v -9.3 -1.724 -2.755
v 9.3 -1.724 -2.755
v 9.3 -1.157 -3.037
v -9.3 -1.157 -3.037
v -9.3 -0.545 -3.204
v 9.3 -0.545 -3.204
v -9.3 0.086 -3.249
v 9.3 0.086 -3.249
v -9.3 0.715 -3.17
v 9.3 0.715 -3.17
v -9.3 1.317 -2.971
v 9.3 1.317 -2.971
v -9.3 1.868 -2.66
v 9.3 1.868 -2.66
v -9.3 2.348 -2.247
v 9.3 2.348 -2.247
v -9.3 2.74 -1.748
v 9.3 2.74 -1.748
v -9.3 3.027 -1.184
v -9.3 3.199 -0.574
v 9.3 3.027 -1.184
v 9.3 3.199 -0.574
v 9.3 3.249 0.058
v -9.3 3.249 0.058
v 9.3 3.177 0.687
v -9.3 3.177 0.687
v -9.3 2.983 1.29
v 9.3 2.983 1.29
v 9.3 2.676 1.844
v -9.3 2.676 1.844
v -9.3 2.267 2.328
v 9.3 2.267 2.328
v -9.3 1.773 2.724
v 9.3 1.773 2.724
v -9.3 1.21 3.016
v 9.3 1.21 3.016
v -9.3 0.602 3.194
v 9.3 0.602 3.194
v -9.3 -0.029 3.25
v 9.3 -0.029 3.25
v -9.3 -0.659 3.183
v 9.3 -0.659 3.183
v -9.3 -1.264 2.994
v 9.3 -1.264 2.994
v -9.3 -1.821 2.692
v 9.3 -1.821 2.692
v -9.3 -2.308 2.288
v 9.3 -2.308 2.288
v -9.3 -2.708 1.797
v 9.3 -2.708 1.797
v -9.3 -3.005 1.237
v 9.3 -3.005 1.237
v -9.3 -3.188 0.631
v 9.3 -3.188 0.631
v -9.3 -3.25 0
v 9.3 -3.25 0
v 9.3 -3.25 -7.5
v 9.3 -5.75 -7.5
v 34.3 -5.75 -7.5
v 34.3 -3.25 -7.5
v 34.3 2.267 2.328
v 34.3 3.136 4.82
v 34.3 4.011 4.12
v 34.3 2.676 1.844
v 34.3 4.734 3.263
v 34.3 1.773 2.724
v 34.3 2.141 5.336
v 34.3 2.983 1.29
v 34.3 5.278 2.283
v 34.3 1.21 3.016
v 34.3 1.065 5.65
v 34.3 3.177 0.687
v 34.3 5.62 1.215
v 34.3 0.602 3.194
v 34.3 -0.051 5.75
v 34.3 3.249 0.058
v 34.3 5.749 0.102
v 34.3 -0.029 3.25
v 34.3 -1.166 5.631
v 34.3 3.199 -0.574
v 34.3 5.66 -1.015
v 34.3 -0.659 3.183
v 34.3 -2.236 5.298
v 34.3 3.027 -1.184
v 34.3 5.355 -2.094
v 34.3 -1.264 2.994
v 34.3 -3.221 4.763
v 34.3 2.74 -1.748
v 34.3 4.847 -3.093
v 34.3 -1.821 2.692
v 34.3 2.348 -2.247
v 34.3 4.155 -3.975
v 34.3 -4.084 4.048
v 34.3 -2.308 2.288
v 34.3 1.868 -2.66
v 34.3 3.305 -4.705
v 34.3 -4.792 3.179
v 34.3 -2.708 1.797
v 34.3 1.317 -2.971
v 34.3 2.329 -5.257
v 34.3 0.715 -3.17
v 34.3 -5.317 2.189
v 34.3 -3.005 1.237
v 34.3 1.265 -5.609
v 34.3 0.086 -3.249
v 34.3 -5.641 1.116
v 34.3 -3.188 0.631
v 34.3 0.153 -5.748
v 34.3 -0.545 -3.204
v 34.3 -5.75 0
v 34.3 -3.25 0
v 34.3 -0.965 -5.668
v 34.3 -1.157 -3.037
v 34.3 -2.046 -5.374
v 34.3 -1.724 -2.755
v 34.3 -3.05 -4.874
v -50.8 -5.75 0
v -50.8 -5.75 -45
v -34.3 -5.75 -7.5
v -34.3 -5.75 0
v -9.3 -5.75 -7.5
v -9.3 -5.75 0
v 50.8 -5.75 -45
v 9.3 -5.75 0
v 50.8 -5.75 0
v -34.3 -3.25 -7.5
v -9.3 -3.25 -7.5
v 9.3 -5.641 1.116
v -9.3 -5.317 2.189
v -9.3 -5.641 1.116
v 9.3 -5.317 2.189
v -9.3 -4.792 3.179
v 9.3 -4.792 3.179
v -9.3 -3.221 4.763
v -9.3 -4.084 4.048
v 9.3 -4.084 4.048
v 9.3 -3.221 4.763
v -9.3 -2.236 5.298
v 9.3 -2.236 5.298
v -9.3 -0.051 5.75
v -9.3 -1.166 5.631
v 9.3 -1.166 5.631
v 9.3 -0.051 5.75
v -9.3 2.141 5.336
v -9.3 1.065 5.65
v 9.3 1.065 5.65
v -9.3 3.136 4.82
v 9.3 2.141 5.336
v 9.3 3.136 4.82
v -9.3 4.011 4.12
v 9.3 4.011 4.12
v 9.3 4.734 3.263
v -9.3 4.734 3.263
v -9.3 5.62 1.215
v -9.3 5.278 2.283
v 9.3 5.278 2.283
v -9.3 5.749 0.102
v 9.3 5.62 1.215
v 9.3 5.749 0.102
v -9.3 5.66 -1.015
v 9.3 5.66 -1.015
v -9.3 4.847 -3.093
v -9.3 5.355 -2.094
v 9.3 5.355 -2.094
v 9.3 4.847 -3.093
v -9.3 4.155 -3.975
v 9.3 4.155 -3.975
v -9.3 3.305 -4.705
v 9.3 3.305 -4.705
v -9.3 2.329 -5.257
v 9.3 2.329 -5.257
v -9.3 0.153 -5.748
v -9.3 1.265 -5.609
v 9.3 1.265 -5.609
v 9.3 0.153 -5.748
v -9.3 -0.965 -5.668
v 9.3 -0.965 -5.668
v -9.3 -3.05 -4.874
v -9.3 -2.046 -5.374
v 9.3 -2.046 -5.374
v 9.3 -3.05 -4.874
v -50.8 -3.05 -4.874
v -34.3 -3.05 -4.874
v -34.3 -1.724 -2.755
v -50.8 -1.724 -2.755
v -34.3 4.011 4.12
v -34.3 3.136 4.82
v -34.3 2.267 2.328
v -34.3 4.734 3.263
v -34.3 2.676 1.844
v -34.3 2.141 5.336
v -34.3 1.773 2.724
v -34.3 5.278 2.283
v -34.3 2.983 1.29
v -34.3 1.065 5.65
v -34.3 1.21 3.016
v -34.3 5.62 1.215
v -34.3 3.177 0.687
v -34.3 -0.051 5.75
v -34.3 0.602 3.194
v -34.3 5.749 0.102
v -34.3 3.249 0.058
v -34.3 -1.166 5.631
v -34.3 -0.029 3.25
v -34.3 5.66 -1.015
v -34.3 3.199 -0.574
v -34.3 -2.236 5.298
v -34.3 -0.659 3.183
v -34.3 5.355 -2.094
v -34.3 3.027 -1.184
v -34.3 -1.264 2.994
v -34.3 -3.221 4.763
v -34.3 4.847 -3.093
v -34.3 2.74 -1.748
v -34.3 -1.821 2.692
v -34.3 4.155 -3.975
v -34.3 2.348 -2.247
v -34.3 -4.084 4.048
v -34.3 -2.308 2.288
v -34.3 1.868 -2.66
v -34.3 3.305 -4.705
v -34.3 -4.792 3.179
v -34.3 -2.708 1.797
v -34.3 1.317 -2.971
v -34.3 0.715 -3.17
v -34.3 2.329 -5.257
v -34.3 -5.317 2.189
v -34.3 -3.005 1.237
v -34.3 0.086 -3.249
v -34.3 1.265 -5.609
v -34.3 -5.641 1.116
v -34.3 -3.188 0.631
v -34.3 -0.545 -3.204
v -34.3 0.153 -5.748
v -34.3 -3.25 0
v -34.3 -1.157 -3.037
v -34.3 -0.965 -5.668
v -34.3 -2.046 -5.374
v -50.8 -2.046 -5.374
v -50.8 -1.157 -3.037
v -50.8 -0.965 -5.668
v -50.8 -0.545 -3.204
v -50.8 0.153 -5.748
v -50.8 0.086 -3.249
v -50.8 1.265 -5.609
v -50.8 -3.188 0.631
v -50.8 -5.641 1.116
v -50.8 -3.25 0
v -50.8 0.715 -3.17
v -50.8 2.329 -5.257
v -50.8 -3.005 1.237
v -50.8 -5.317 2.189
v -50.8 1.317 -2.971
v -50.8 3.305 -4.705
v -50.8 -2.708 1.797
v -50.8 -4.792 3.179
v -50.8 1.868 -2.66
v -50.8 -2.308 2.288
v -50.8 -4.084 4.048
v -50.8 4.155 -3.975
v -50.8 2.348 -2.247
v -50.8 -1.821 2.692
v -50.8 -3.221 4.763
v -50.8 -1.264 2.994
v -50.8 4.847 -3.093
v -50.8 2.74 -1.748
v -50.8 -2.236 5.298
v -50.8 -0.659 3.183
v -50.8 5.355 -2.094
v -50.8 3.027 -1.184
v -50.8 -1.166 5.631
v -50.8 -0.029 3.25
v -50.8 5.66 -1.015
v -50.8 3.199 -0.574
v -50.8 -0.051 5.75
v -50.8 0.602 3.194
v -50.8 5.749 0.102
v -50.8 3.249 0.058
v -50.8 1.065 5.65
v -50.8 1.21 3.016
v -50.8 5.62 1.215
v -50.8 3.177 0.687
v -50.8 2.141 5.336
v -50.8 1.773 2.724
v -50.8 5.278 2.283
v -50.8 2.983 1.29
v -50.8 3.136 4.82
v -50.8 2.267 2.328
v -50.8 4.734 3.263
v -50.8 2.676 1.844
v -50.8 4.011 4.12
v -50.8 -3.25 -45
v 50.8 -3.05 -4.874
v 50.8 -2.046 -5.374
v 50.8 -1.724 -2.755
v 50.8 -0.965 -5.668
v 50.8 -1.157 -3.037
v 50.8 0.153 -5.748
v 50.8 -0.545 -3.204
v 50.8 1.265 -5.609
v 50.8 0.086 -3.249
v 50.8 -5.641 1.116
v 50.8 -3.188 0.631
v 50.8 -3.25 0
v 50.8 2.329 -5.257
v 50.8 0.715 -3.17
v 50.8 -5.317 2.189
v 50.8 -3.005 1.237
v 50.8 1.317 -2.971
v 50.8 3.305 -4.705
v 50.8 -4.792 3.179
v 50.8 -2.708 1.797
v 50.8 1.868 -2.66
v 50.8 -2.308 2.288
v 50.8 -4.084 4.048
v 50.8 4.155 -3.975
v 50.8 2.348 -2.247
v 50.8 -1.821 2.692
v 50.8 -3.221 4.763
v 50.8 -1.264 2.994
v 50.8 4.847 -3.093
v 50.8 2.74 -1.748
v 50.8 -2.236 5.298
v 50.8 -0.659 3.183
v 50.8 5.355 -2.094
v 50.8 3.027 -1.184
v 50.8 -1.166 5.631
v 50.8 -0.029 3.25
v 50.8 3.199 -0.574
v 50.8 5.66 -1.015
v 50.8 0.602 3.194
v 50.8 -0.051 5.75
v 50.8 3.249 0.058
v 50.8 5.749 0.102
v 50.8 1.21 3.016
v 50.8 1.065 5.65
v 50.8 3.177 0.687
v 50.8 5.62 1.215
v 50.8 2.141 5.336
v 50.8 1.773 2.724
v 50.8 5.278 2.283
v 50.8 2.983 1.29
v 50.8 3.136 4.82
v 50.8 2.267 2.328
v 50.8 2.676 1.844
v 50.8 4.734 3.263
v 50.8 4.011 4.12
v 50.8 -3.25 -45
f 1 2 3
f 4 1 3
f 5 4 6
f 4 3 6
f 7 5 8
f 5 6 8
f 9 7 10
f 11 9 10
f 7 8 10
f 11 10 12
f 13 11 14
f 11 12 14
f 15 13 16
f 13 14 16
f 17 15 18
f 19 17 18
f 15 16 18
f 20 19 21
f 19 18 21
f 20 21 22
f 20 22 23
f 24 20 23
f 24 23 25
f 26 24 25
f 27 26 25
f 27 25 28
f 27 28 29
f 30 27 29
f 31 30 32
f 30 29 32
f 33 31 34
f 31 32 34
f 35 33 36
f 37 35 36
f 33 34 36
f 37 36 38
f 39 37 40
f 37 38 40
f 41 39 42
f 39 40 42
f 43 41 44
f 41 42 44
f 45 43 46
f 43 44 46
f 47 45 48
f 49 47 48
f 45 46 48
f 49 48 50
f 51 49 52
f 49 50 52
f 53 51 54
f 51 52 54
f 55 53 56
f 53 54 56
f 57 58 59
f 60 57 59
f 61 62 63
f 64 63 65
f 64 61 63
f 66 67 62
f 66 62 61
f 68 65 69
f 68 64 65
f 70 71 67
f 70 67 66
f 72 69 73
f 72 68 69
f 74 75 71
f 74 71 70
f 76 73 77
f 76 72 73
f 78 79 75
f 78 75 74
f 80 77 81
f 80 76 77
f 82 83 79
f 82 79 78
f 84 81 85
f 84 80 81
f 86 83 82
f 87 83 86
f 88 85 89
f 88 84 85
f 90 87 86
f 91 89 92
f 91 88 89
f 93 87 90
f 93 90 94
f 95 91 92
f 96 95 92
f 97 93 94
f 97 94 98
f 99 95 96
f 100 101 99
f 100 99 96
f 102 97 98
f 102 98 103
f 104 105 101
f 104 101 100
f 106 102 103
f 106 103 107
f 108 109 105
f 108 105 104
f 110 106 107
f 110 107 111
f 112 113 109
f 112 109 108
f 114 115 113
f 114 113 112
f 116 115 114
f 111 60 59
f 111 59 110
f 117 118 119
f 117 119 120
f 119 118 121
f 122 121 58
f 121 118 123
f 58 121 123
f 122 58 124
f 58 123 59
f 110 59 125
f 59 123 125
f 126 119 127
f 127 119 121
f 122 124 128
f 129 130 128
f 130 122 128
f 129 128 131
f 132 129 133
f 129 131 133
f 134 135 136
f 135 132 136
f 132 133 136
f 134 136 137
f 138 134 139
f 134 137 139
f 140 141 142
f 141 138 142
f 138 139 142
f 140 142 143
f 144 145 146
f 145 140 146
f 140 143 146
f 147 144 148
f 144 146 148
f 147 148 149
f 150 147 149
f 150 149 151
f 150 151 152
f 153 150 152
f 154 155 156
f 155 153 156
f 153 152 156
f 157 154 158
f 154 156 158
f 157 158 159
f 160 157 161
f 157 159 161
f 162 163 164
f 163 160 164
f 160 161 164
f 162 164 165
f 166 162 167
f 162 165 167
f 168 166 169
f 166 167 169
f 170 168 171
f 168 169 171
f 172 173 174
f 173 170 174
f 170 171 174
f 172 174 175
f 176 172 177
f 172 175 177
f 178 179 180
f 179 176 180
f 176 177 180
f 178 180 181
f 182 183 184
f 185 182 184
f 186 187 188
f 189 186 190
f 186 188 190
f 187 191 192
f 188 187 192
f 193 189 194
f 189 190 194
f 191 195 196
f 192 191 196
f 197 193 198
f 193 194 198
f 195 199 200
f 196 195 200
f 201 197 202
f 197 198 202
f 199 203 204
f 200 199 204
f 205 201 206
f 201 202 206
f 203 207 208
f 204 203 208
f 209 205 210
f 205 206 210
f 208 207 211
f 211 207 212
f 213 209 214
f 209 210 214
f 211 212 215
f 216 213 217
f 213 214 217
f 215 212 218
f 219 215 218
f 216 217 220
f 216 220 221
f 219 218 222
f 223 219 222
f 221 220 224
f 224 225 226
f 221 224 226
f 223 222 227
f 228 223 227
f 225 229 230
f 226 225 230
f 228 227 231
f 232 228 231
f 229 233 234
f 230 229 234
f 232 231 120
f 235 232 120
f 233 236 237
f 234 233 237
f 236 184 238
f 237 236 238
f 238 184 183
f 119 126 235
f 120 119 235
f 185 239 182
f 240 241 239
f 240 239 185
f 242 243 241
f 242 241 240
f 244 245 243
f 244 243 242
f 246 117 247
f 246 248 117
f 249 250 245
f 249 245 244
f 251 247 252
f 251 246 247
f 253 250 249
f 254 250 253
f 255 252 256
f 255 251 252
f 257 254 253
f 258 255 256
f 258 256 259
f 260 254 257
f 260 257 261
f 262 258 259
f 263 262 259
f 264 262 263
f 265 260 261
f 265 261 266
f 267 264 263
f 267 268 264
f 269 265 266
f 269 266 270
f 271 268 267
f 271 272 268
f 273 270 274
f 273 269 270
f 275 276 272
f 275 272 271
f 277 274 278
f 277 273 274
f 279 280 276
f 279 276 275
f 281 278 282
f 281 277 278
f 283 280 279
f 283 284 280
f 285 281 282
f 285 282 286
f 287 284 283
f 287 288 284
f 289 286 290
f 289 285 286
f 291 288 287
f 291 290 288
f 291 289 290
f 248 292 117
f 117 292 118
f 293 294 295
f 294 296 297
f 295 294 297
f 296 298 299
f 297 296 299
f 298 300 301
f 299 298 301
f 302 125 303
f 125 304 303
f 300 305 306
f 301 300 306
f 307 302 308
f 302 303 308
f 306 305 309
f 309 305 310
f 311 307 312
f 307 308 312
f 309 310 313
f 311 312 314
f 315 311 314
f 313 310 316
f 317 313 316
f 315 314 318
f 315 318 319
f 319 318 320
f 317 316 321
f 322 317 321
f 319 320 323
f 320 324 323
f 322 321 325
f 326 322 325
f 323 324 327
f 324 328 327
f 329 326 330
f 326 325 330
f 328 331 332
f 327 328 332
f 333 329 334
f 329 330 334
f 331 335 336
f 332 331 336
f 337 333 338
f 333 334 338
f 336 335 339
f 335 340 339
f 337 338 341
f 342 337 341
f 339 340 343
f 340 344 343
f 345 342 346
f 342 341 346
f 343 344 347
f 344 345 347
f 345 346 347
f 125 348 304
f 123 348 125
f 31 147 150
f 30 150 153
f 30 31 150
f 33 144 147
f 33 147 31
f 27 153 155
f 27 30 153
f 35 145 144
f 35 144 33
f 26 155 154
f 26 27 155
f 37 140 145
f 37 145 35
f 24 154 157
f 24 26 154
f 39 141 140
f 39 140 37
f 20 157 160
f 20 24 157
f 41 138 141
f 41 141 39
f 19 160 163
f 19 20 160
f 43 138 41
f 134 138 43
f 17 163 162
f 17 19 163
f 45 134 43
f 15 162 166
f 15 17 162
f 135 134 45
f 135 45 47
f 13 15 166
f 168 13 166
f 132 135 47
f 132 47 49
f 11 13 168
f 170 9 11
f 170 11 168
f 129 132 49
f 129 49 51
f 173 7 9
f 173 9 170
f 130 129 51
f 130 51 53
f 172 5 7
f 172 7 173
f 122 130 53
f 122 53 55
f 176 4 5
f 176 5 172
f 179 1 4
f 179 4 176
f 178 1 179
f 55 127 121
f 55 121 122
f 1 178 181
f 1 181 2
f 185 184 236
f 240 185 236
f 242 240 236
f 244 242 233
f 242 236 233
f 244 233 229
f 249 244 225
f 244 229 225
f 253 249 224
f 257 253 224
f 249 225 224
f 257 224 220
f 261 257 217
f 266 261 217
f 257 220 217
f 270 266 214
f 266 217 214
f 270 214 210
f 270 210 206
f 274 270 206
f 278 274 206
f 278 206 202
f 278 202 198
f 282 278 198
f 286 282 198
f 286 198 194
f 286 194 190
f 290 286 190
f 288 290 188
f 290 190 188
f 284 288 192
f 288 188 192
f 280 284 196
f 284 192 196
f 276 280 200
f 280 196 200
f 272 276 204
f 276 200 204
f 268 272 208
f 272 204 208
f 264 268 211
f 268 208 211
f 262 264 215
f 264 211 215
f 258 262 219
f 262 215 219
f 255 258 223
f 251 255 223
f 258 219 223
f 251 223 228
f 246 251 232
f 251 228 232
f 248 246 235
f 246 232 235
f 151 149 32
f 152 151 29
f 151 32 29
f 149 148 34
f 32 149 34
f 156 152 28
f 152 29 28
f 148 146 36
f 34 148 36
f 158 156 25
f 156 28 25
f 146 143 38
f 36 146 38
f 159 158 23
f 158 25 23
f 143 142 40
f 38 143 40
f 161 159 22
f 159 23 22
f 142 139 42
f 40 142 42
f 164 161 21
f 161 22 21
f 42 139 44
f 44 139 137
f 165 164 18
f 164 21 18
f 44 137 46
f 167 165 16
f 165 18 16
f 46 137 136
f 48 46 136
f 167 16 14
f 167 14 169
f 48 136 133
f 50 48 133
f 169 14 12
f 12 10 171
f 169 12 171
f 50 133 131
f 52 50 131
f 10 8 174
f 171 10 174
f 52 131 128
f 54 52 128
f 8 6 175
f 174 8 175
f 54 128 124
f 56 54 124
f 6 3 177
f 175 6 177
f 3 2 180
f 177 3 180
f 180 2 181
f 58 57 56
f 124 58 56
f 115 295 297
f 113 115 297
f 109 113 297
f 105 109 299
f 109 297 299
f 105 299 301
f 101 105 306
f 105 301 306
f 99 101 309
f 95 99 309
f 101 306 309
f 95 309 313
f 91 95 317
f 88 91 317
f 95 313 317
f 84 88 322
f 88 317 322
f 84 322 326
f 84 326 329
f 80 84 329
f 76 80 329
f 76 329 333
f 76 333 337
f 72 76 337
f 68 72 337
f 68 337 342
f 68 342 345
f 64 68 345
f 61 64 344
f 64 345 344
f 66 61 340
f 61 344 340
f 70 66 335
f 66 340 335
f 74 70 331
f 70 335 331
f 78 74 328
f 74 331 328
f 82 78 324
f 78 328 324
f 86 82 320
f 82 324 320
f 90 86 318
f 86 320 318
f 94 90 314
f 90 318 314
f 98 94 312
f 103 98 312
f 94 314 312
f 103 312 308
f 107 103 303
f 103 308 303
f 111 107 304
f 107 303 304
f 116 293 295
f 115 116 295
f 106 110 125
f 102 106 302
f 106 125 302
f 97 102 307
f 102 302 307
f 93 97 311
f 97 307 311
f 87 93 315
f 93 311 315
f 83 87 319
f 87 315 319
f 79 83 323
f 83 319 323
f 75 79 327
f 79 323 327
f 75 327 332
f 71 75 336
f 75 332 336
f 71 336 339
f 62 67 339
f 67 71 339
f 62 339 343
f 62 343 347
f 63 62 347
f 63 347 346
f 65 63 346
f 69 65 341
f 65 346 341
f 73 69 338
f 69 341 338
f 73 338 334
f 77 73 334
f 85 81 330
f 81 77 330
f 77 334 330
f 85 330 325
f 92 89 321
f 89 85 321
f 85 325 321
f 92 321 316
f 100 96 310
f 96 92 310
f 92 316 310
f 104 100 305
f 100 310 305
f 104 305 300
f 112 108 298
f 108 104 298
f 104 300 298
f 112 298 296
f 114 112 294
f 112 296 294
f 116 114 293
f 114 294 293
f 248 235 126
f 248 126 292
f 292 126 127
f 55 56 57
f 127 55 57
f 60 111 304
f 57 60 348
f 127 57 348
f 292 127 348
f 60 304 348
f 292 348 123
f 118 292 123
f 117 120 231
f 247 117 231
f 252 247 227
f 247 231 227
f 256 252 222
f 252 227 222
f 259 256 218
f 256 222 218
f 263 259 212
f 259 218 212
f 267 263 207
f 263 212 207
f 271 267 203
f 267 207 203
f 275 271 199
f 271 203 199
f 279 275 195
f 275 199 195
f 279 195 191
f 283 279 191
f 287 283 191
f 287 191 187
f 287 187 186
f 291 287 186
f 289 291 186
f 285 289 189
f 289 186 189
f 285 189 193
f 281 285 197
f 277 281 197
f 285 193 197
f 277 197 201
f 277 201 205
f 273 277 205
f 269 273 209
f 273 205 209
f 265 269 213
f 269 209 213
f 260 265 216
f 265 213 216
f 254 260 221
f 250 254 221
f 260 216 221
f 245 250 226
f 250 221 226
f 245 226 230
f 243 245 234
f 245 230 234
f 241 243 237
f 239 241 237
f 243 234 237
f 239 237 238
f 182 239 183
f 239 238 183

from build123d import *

# Parameters (mm, degrees)
BASE_FLANGE1_DEPTH      = 50.8
CUT_EXTRUDE1_DEPTH      = 69.10802082
CUT_EXTRUDE1_DEPTH_BACK = 69.10802082
SKETCH6_W               = 25
SKETCH6_H               = 58.775055245


# Sheet-metal steps are written as plain solids
with BuildPart() as part:
    # Sketch1 → Base-Flange1 (new, symmetric)
    with BuildSketch(Plane(origin=(0, 0, 0), x_dir=(0, 0, -1), z_dir=(1, 0, 0))):
        with BuildLine():
            Line((45, -5.75), (0, -5.75))
            ThreePointArc((0, -5.75), (-2.786126343, 5.029910536), (4.874423043, -3.05))
            Line((4.874423043, -3.05), (2.755108676, -1.723913043))
            ThreePointArc((2.755108676, -1.723913043), (-1.574767064, 2.842992912), (0, -3.25))
            Line((0, -3.25), (45, -3.25))
            Line((45, -3.25), (45, -5.75))
        make_face()
    extrude(amount=BASE_FLANGE1_DEPTH, both=True)

    # Sketch6 → Cut-Extrude1 (cut, two sides: drawn at the far end of the back side and taken through both)
    with BuildSketch(Plane(origin=(0, 0, 0), x_dir=(1, 0, 0), z_dir=(0, 1, 0)).offset(-CUT_EXTRUDE1_DEPTH_BACK)):
        with Locations((-21.8, -21.887527623)):
            Rectangle(SKETCH6_W, SKETCH6_H)
        with Locations((21.8, -21.887527623)):
            Rectangle(SKETCH6_W, SKETCH6_H)
    extrude(amount=CUT_EXTRUDE1_DEPTH + CUT_EXTRUDE1_DEPTH_BACK, mode=Mode.SUBTRACT)


solid = part.part
